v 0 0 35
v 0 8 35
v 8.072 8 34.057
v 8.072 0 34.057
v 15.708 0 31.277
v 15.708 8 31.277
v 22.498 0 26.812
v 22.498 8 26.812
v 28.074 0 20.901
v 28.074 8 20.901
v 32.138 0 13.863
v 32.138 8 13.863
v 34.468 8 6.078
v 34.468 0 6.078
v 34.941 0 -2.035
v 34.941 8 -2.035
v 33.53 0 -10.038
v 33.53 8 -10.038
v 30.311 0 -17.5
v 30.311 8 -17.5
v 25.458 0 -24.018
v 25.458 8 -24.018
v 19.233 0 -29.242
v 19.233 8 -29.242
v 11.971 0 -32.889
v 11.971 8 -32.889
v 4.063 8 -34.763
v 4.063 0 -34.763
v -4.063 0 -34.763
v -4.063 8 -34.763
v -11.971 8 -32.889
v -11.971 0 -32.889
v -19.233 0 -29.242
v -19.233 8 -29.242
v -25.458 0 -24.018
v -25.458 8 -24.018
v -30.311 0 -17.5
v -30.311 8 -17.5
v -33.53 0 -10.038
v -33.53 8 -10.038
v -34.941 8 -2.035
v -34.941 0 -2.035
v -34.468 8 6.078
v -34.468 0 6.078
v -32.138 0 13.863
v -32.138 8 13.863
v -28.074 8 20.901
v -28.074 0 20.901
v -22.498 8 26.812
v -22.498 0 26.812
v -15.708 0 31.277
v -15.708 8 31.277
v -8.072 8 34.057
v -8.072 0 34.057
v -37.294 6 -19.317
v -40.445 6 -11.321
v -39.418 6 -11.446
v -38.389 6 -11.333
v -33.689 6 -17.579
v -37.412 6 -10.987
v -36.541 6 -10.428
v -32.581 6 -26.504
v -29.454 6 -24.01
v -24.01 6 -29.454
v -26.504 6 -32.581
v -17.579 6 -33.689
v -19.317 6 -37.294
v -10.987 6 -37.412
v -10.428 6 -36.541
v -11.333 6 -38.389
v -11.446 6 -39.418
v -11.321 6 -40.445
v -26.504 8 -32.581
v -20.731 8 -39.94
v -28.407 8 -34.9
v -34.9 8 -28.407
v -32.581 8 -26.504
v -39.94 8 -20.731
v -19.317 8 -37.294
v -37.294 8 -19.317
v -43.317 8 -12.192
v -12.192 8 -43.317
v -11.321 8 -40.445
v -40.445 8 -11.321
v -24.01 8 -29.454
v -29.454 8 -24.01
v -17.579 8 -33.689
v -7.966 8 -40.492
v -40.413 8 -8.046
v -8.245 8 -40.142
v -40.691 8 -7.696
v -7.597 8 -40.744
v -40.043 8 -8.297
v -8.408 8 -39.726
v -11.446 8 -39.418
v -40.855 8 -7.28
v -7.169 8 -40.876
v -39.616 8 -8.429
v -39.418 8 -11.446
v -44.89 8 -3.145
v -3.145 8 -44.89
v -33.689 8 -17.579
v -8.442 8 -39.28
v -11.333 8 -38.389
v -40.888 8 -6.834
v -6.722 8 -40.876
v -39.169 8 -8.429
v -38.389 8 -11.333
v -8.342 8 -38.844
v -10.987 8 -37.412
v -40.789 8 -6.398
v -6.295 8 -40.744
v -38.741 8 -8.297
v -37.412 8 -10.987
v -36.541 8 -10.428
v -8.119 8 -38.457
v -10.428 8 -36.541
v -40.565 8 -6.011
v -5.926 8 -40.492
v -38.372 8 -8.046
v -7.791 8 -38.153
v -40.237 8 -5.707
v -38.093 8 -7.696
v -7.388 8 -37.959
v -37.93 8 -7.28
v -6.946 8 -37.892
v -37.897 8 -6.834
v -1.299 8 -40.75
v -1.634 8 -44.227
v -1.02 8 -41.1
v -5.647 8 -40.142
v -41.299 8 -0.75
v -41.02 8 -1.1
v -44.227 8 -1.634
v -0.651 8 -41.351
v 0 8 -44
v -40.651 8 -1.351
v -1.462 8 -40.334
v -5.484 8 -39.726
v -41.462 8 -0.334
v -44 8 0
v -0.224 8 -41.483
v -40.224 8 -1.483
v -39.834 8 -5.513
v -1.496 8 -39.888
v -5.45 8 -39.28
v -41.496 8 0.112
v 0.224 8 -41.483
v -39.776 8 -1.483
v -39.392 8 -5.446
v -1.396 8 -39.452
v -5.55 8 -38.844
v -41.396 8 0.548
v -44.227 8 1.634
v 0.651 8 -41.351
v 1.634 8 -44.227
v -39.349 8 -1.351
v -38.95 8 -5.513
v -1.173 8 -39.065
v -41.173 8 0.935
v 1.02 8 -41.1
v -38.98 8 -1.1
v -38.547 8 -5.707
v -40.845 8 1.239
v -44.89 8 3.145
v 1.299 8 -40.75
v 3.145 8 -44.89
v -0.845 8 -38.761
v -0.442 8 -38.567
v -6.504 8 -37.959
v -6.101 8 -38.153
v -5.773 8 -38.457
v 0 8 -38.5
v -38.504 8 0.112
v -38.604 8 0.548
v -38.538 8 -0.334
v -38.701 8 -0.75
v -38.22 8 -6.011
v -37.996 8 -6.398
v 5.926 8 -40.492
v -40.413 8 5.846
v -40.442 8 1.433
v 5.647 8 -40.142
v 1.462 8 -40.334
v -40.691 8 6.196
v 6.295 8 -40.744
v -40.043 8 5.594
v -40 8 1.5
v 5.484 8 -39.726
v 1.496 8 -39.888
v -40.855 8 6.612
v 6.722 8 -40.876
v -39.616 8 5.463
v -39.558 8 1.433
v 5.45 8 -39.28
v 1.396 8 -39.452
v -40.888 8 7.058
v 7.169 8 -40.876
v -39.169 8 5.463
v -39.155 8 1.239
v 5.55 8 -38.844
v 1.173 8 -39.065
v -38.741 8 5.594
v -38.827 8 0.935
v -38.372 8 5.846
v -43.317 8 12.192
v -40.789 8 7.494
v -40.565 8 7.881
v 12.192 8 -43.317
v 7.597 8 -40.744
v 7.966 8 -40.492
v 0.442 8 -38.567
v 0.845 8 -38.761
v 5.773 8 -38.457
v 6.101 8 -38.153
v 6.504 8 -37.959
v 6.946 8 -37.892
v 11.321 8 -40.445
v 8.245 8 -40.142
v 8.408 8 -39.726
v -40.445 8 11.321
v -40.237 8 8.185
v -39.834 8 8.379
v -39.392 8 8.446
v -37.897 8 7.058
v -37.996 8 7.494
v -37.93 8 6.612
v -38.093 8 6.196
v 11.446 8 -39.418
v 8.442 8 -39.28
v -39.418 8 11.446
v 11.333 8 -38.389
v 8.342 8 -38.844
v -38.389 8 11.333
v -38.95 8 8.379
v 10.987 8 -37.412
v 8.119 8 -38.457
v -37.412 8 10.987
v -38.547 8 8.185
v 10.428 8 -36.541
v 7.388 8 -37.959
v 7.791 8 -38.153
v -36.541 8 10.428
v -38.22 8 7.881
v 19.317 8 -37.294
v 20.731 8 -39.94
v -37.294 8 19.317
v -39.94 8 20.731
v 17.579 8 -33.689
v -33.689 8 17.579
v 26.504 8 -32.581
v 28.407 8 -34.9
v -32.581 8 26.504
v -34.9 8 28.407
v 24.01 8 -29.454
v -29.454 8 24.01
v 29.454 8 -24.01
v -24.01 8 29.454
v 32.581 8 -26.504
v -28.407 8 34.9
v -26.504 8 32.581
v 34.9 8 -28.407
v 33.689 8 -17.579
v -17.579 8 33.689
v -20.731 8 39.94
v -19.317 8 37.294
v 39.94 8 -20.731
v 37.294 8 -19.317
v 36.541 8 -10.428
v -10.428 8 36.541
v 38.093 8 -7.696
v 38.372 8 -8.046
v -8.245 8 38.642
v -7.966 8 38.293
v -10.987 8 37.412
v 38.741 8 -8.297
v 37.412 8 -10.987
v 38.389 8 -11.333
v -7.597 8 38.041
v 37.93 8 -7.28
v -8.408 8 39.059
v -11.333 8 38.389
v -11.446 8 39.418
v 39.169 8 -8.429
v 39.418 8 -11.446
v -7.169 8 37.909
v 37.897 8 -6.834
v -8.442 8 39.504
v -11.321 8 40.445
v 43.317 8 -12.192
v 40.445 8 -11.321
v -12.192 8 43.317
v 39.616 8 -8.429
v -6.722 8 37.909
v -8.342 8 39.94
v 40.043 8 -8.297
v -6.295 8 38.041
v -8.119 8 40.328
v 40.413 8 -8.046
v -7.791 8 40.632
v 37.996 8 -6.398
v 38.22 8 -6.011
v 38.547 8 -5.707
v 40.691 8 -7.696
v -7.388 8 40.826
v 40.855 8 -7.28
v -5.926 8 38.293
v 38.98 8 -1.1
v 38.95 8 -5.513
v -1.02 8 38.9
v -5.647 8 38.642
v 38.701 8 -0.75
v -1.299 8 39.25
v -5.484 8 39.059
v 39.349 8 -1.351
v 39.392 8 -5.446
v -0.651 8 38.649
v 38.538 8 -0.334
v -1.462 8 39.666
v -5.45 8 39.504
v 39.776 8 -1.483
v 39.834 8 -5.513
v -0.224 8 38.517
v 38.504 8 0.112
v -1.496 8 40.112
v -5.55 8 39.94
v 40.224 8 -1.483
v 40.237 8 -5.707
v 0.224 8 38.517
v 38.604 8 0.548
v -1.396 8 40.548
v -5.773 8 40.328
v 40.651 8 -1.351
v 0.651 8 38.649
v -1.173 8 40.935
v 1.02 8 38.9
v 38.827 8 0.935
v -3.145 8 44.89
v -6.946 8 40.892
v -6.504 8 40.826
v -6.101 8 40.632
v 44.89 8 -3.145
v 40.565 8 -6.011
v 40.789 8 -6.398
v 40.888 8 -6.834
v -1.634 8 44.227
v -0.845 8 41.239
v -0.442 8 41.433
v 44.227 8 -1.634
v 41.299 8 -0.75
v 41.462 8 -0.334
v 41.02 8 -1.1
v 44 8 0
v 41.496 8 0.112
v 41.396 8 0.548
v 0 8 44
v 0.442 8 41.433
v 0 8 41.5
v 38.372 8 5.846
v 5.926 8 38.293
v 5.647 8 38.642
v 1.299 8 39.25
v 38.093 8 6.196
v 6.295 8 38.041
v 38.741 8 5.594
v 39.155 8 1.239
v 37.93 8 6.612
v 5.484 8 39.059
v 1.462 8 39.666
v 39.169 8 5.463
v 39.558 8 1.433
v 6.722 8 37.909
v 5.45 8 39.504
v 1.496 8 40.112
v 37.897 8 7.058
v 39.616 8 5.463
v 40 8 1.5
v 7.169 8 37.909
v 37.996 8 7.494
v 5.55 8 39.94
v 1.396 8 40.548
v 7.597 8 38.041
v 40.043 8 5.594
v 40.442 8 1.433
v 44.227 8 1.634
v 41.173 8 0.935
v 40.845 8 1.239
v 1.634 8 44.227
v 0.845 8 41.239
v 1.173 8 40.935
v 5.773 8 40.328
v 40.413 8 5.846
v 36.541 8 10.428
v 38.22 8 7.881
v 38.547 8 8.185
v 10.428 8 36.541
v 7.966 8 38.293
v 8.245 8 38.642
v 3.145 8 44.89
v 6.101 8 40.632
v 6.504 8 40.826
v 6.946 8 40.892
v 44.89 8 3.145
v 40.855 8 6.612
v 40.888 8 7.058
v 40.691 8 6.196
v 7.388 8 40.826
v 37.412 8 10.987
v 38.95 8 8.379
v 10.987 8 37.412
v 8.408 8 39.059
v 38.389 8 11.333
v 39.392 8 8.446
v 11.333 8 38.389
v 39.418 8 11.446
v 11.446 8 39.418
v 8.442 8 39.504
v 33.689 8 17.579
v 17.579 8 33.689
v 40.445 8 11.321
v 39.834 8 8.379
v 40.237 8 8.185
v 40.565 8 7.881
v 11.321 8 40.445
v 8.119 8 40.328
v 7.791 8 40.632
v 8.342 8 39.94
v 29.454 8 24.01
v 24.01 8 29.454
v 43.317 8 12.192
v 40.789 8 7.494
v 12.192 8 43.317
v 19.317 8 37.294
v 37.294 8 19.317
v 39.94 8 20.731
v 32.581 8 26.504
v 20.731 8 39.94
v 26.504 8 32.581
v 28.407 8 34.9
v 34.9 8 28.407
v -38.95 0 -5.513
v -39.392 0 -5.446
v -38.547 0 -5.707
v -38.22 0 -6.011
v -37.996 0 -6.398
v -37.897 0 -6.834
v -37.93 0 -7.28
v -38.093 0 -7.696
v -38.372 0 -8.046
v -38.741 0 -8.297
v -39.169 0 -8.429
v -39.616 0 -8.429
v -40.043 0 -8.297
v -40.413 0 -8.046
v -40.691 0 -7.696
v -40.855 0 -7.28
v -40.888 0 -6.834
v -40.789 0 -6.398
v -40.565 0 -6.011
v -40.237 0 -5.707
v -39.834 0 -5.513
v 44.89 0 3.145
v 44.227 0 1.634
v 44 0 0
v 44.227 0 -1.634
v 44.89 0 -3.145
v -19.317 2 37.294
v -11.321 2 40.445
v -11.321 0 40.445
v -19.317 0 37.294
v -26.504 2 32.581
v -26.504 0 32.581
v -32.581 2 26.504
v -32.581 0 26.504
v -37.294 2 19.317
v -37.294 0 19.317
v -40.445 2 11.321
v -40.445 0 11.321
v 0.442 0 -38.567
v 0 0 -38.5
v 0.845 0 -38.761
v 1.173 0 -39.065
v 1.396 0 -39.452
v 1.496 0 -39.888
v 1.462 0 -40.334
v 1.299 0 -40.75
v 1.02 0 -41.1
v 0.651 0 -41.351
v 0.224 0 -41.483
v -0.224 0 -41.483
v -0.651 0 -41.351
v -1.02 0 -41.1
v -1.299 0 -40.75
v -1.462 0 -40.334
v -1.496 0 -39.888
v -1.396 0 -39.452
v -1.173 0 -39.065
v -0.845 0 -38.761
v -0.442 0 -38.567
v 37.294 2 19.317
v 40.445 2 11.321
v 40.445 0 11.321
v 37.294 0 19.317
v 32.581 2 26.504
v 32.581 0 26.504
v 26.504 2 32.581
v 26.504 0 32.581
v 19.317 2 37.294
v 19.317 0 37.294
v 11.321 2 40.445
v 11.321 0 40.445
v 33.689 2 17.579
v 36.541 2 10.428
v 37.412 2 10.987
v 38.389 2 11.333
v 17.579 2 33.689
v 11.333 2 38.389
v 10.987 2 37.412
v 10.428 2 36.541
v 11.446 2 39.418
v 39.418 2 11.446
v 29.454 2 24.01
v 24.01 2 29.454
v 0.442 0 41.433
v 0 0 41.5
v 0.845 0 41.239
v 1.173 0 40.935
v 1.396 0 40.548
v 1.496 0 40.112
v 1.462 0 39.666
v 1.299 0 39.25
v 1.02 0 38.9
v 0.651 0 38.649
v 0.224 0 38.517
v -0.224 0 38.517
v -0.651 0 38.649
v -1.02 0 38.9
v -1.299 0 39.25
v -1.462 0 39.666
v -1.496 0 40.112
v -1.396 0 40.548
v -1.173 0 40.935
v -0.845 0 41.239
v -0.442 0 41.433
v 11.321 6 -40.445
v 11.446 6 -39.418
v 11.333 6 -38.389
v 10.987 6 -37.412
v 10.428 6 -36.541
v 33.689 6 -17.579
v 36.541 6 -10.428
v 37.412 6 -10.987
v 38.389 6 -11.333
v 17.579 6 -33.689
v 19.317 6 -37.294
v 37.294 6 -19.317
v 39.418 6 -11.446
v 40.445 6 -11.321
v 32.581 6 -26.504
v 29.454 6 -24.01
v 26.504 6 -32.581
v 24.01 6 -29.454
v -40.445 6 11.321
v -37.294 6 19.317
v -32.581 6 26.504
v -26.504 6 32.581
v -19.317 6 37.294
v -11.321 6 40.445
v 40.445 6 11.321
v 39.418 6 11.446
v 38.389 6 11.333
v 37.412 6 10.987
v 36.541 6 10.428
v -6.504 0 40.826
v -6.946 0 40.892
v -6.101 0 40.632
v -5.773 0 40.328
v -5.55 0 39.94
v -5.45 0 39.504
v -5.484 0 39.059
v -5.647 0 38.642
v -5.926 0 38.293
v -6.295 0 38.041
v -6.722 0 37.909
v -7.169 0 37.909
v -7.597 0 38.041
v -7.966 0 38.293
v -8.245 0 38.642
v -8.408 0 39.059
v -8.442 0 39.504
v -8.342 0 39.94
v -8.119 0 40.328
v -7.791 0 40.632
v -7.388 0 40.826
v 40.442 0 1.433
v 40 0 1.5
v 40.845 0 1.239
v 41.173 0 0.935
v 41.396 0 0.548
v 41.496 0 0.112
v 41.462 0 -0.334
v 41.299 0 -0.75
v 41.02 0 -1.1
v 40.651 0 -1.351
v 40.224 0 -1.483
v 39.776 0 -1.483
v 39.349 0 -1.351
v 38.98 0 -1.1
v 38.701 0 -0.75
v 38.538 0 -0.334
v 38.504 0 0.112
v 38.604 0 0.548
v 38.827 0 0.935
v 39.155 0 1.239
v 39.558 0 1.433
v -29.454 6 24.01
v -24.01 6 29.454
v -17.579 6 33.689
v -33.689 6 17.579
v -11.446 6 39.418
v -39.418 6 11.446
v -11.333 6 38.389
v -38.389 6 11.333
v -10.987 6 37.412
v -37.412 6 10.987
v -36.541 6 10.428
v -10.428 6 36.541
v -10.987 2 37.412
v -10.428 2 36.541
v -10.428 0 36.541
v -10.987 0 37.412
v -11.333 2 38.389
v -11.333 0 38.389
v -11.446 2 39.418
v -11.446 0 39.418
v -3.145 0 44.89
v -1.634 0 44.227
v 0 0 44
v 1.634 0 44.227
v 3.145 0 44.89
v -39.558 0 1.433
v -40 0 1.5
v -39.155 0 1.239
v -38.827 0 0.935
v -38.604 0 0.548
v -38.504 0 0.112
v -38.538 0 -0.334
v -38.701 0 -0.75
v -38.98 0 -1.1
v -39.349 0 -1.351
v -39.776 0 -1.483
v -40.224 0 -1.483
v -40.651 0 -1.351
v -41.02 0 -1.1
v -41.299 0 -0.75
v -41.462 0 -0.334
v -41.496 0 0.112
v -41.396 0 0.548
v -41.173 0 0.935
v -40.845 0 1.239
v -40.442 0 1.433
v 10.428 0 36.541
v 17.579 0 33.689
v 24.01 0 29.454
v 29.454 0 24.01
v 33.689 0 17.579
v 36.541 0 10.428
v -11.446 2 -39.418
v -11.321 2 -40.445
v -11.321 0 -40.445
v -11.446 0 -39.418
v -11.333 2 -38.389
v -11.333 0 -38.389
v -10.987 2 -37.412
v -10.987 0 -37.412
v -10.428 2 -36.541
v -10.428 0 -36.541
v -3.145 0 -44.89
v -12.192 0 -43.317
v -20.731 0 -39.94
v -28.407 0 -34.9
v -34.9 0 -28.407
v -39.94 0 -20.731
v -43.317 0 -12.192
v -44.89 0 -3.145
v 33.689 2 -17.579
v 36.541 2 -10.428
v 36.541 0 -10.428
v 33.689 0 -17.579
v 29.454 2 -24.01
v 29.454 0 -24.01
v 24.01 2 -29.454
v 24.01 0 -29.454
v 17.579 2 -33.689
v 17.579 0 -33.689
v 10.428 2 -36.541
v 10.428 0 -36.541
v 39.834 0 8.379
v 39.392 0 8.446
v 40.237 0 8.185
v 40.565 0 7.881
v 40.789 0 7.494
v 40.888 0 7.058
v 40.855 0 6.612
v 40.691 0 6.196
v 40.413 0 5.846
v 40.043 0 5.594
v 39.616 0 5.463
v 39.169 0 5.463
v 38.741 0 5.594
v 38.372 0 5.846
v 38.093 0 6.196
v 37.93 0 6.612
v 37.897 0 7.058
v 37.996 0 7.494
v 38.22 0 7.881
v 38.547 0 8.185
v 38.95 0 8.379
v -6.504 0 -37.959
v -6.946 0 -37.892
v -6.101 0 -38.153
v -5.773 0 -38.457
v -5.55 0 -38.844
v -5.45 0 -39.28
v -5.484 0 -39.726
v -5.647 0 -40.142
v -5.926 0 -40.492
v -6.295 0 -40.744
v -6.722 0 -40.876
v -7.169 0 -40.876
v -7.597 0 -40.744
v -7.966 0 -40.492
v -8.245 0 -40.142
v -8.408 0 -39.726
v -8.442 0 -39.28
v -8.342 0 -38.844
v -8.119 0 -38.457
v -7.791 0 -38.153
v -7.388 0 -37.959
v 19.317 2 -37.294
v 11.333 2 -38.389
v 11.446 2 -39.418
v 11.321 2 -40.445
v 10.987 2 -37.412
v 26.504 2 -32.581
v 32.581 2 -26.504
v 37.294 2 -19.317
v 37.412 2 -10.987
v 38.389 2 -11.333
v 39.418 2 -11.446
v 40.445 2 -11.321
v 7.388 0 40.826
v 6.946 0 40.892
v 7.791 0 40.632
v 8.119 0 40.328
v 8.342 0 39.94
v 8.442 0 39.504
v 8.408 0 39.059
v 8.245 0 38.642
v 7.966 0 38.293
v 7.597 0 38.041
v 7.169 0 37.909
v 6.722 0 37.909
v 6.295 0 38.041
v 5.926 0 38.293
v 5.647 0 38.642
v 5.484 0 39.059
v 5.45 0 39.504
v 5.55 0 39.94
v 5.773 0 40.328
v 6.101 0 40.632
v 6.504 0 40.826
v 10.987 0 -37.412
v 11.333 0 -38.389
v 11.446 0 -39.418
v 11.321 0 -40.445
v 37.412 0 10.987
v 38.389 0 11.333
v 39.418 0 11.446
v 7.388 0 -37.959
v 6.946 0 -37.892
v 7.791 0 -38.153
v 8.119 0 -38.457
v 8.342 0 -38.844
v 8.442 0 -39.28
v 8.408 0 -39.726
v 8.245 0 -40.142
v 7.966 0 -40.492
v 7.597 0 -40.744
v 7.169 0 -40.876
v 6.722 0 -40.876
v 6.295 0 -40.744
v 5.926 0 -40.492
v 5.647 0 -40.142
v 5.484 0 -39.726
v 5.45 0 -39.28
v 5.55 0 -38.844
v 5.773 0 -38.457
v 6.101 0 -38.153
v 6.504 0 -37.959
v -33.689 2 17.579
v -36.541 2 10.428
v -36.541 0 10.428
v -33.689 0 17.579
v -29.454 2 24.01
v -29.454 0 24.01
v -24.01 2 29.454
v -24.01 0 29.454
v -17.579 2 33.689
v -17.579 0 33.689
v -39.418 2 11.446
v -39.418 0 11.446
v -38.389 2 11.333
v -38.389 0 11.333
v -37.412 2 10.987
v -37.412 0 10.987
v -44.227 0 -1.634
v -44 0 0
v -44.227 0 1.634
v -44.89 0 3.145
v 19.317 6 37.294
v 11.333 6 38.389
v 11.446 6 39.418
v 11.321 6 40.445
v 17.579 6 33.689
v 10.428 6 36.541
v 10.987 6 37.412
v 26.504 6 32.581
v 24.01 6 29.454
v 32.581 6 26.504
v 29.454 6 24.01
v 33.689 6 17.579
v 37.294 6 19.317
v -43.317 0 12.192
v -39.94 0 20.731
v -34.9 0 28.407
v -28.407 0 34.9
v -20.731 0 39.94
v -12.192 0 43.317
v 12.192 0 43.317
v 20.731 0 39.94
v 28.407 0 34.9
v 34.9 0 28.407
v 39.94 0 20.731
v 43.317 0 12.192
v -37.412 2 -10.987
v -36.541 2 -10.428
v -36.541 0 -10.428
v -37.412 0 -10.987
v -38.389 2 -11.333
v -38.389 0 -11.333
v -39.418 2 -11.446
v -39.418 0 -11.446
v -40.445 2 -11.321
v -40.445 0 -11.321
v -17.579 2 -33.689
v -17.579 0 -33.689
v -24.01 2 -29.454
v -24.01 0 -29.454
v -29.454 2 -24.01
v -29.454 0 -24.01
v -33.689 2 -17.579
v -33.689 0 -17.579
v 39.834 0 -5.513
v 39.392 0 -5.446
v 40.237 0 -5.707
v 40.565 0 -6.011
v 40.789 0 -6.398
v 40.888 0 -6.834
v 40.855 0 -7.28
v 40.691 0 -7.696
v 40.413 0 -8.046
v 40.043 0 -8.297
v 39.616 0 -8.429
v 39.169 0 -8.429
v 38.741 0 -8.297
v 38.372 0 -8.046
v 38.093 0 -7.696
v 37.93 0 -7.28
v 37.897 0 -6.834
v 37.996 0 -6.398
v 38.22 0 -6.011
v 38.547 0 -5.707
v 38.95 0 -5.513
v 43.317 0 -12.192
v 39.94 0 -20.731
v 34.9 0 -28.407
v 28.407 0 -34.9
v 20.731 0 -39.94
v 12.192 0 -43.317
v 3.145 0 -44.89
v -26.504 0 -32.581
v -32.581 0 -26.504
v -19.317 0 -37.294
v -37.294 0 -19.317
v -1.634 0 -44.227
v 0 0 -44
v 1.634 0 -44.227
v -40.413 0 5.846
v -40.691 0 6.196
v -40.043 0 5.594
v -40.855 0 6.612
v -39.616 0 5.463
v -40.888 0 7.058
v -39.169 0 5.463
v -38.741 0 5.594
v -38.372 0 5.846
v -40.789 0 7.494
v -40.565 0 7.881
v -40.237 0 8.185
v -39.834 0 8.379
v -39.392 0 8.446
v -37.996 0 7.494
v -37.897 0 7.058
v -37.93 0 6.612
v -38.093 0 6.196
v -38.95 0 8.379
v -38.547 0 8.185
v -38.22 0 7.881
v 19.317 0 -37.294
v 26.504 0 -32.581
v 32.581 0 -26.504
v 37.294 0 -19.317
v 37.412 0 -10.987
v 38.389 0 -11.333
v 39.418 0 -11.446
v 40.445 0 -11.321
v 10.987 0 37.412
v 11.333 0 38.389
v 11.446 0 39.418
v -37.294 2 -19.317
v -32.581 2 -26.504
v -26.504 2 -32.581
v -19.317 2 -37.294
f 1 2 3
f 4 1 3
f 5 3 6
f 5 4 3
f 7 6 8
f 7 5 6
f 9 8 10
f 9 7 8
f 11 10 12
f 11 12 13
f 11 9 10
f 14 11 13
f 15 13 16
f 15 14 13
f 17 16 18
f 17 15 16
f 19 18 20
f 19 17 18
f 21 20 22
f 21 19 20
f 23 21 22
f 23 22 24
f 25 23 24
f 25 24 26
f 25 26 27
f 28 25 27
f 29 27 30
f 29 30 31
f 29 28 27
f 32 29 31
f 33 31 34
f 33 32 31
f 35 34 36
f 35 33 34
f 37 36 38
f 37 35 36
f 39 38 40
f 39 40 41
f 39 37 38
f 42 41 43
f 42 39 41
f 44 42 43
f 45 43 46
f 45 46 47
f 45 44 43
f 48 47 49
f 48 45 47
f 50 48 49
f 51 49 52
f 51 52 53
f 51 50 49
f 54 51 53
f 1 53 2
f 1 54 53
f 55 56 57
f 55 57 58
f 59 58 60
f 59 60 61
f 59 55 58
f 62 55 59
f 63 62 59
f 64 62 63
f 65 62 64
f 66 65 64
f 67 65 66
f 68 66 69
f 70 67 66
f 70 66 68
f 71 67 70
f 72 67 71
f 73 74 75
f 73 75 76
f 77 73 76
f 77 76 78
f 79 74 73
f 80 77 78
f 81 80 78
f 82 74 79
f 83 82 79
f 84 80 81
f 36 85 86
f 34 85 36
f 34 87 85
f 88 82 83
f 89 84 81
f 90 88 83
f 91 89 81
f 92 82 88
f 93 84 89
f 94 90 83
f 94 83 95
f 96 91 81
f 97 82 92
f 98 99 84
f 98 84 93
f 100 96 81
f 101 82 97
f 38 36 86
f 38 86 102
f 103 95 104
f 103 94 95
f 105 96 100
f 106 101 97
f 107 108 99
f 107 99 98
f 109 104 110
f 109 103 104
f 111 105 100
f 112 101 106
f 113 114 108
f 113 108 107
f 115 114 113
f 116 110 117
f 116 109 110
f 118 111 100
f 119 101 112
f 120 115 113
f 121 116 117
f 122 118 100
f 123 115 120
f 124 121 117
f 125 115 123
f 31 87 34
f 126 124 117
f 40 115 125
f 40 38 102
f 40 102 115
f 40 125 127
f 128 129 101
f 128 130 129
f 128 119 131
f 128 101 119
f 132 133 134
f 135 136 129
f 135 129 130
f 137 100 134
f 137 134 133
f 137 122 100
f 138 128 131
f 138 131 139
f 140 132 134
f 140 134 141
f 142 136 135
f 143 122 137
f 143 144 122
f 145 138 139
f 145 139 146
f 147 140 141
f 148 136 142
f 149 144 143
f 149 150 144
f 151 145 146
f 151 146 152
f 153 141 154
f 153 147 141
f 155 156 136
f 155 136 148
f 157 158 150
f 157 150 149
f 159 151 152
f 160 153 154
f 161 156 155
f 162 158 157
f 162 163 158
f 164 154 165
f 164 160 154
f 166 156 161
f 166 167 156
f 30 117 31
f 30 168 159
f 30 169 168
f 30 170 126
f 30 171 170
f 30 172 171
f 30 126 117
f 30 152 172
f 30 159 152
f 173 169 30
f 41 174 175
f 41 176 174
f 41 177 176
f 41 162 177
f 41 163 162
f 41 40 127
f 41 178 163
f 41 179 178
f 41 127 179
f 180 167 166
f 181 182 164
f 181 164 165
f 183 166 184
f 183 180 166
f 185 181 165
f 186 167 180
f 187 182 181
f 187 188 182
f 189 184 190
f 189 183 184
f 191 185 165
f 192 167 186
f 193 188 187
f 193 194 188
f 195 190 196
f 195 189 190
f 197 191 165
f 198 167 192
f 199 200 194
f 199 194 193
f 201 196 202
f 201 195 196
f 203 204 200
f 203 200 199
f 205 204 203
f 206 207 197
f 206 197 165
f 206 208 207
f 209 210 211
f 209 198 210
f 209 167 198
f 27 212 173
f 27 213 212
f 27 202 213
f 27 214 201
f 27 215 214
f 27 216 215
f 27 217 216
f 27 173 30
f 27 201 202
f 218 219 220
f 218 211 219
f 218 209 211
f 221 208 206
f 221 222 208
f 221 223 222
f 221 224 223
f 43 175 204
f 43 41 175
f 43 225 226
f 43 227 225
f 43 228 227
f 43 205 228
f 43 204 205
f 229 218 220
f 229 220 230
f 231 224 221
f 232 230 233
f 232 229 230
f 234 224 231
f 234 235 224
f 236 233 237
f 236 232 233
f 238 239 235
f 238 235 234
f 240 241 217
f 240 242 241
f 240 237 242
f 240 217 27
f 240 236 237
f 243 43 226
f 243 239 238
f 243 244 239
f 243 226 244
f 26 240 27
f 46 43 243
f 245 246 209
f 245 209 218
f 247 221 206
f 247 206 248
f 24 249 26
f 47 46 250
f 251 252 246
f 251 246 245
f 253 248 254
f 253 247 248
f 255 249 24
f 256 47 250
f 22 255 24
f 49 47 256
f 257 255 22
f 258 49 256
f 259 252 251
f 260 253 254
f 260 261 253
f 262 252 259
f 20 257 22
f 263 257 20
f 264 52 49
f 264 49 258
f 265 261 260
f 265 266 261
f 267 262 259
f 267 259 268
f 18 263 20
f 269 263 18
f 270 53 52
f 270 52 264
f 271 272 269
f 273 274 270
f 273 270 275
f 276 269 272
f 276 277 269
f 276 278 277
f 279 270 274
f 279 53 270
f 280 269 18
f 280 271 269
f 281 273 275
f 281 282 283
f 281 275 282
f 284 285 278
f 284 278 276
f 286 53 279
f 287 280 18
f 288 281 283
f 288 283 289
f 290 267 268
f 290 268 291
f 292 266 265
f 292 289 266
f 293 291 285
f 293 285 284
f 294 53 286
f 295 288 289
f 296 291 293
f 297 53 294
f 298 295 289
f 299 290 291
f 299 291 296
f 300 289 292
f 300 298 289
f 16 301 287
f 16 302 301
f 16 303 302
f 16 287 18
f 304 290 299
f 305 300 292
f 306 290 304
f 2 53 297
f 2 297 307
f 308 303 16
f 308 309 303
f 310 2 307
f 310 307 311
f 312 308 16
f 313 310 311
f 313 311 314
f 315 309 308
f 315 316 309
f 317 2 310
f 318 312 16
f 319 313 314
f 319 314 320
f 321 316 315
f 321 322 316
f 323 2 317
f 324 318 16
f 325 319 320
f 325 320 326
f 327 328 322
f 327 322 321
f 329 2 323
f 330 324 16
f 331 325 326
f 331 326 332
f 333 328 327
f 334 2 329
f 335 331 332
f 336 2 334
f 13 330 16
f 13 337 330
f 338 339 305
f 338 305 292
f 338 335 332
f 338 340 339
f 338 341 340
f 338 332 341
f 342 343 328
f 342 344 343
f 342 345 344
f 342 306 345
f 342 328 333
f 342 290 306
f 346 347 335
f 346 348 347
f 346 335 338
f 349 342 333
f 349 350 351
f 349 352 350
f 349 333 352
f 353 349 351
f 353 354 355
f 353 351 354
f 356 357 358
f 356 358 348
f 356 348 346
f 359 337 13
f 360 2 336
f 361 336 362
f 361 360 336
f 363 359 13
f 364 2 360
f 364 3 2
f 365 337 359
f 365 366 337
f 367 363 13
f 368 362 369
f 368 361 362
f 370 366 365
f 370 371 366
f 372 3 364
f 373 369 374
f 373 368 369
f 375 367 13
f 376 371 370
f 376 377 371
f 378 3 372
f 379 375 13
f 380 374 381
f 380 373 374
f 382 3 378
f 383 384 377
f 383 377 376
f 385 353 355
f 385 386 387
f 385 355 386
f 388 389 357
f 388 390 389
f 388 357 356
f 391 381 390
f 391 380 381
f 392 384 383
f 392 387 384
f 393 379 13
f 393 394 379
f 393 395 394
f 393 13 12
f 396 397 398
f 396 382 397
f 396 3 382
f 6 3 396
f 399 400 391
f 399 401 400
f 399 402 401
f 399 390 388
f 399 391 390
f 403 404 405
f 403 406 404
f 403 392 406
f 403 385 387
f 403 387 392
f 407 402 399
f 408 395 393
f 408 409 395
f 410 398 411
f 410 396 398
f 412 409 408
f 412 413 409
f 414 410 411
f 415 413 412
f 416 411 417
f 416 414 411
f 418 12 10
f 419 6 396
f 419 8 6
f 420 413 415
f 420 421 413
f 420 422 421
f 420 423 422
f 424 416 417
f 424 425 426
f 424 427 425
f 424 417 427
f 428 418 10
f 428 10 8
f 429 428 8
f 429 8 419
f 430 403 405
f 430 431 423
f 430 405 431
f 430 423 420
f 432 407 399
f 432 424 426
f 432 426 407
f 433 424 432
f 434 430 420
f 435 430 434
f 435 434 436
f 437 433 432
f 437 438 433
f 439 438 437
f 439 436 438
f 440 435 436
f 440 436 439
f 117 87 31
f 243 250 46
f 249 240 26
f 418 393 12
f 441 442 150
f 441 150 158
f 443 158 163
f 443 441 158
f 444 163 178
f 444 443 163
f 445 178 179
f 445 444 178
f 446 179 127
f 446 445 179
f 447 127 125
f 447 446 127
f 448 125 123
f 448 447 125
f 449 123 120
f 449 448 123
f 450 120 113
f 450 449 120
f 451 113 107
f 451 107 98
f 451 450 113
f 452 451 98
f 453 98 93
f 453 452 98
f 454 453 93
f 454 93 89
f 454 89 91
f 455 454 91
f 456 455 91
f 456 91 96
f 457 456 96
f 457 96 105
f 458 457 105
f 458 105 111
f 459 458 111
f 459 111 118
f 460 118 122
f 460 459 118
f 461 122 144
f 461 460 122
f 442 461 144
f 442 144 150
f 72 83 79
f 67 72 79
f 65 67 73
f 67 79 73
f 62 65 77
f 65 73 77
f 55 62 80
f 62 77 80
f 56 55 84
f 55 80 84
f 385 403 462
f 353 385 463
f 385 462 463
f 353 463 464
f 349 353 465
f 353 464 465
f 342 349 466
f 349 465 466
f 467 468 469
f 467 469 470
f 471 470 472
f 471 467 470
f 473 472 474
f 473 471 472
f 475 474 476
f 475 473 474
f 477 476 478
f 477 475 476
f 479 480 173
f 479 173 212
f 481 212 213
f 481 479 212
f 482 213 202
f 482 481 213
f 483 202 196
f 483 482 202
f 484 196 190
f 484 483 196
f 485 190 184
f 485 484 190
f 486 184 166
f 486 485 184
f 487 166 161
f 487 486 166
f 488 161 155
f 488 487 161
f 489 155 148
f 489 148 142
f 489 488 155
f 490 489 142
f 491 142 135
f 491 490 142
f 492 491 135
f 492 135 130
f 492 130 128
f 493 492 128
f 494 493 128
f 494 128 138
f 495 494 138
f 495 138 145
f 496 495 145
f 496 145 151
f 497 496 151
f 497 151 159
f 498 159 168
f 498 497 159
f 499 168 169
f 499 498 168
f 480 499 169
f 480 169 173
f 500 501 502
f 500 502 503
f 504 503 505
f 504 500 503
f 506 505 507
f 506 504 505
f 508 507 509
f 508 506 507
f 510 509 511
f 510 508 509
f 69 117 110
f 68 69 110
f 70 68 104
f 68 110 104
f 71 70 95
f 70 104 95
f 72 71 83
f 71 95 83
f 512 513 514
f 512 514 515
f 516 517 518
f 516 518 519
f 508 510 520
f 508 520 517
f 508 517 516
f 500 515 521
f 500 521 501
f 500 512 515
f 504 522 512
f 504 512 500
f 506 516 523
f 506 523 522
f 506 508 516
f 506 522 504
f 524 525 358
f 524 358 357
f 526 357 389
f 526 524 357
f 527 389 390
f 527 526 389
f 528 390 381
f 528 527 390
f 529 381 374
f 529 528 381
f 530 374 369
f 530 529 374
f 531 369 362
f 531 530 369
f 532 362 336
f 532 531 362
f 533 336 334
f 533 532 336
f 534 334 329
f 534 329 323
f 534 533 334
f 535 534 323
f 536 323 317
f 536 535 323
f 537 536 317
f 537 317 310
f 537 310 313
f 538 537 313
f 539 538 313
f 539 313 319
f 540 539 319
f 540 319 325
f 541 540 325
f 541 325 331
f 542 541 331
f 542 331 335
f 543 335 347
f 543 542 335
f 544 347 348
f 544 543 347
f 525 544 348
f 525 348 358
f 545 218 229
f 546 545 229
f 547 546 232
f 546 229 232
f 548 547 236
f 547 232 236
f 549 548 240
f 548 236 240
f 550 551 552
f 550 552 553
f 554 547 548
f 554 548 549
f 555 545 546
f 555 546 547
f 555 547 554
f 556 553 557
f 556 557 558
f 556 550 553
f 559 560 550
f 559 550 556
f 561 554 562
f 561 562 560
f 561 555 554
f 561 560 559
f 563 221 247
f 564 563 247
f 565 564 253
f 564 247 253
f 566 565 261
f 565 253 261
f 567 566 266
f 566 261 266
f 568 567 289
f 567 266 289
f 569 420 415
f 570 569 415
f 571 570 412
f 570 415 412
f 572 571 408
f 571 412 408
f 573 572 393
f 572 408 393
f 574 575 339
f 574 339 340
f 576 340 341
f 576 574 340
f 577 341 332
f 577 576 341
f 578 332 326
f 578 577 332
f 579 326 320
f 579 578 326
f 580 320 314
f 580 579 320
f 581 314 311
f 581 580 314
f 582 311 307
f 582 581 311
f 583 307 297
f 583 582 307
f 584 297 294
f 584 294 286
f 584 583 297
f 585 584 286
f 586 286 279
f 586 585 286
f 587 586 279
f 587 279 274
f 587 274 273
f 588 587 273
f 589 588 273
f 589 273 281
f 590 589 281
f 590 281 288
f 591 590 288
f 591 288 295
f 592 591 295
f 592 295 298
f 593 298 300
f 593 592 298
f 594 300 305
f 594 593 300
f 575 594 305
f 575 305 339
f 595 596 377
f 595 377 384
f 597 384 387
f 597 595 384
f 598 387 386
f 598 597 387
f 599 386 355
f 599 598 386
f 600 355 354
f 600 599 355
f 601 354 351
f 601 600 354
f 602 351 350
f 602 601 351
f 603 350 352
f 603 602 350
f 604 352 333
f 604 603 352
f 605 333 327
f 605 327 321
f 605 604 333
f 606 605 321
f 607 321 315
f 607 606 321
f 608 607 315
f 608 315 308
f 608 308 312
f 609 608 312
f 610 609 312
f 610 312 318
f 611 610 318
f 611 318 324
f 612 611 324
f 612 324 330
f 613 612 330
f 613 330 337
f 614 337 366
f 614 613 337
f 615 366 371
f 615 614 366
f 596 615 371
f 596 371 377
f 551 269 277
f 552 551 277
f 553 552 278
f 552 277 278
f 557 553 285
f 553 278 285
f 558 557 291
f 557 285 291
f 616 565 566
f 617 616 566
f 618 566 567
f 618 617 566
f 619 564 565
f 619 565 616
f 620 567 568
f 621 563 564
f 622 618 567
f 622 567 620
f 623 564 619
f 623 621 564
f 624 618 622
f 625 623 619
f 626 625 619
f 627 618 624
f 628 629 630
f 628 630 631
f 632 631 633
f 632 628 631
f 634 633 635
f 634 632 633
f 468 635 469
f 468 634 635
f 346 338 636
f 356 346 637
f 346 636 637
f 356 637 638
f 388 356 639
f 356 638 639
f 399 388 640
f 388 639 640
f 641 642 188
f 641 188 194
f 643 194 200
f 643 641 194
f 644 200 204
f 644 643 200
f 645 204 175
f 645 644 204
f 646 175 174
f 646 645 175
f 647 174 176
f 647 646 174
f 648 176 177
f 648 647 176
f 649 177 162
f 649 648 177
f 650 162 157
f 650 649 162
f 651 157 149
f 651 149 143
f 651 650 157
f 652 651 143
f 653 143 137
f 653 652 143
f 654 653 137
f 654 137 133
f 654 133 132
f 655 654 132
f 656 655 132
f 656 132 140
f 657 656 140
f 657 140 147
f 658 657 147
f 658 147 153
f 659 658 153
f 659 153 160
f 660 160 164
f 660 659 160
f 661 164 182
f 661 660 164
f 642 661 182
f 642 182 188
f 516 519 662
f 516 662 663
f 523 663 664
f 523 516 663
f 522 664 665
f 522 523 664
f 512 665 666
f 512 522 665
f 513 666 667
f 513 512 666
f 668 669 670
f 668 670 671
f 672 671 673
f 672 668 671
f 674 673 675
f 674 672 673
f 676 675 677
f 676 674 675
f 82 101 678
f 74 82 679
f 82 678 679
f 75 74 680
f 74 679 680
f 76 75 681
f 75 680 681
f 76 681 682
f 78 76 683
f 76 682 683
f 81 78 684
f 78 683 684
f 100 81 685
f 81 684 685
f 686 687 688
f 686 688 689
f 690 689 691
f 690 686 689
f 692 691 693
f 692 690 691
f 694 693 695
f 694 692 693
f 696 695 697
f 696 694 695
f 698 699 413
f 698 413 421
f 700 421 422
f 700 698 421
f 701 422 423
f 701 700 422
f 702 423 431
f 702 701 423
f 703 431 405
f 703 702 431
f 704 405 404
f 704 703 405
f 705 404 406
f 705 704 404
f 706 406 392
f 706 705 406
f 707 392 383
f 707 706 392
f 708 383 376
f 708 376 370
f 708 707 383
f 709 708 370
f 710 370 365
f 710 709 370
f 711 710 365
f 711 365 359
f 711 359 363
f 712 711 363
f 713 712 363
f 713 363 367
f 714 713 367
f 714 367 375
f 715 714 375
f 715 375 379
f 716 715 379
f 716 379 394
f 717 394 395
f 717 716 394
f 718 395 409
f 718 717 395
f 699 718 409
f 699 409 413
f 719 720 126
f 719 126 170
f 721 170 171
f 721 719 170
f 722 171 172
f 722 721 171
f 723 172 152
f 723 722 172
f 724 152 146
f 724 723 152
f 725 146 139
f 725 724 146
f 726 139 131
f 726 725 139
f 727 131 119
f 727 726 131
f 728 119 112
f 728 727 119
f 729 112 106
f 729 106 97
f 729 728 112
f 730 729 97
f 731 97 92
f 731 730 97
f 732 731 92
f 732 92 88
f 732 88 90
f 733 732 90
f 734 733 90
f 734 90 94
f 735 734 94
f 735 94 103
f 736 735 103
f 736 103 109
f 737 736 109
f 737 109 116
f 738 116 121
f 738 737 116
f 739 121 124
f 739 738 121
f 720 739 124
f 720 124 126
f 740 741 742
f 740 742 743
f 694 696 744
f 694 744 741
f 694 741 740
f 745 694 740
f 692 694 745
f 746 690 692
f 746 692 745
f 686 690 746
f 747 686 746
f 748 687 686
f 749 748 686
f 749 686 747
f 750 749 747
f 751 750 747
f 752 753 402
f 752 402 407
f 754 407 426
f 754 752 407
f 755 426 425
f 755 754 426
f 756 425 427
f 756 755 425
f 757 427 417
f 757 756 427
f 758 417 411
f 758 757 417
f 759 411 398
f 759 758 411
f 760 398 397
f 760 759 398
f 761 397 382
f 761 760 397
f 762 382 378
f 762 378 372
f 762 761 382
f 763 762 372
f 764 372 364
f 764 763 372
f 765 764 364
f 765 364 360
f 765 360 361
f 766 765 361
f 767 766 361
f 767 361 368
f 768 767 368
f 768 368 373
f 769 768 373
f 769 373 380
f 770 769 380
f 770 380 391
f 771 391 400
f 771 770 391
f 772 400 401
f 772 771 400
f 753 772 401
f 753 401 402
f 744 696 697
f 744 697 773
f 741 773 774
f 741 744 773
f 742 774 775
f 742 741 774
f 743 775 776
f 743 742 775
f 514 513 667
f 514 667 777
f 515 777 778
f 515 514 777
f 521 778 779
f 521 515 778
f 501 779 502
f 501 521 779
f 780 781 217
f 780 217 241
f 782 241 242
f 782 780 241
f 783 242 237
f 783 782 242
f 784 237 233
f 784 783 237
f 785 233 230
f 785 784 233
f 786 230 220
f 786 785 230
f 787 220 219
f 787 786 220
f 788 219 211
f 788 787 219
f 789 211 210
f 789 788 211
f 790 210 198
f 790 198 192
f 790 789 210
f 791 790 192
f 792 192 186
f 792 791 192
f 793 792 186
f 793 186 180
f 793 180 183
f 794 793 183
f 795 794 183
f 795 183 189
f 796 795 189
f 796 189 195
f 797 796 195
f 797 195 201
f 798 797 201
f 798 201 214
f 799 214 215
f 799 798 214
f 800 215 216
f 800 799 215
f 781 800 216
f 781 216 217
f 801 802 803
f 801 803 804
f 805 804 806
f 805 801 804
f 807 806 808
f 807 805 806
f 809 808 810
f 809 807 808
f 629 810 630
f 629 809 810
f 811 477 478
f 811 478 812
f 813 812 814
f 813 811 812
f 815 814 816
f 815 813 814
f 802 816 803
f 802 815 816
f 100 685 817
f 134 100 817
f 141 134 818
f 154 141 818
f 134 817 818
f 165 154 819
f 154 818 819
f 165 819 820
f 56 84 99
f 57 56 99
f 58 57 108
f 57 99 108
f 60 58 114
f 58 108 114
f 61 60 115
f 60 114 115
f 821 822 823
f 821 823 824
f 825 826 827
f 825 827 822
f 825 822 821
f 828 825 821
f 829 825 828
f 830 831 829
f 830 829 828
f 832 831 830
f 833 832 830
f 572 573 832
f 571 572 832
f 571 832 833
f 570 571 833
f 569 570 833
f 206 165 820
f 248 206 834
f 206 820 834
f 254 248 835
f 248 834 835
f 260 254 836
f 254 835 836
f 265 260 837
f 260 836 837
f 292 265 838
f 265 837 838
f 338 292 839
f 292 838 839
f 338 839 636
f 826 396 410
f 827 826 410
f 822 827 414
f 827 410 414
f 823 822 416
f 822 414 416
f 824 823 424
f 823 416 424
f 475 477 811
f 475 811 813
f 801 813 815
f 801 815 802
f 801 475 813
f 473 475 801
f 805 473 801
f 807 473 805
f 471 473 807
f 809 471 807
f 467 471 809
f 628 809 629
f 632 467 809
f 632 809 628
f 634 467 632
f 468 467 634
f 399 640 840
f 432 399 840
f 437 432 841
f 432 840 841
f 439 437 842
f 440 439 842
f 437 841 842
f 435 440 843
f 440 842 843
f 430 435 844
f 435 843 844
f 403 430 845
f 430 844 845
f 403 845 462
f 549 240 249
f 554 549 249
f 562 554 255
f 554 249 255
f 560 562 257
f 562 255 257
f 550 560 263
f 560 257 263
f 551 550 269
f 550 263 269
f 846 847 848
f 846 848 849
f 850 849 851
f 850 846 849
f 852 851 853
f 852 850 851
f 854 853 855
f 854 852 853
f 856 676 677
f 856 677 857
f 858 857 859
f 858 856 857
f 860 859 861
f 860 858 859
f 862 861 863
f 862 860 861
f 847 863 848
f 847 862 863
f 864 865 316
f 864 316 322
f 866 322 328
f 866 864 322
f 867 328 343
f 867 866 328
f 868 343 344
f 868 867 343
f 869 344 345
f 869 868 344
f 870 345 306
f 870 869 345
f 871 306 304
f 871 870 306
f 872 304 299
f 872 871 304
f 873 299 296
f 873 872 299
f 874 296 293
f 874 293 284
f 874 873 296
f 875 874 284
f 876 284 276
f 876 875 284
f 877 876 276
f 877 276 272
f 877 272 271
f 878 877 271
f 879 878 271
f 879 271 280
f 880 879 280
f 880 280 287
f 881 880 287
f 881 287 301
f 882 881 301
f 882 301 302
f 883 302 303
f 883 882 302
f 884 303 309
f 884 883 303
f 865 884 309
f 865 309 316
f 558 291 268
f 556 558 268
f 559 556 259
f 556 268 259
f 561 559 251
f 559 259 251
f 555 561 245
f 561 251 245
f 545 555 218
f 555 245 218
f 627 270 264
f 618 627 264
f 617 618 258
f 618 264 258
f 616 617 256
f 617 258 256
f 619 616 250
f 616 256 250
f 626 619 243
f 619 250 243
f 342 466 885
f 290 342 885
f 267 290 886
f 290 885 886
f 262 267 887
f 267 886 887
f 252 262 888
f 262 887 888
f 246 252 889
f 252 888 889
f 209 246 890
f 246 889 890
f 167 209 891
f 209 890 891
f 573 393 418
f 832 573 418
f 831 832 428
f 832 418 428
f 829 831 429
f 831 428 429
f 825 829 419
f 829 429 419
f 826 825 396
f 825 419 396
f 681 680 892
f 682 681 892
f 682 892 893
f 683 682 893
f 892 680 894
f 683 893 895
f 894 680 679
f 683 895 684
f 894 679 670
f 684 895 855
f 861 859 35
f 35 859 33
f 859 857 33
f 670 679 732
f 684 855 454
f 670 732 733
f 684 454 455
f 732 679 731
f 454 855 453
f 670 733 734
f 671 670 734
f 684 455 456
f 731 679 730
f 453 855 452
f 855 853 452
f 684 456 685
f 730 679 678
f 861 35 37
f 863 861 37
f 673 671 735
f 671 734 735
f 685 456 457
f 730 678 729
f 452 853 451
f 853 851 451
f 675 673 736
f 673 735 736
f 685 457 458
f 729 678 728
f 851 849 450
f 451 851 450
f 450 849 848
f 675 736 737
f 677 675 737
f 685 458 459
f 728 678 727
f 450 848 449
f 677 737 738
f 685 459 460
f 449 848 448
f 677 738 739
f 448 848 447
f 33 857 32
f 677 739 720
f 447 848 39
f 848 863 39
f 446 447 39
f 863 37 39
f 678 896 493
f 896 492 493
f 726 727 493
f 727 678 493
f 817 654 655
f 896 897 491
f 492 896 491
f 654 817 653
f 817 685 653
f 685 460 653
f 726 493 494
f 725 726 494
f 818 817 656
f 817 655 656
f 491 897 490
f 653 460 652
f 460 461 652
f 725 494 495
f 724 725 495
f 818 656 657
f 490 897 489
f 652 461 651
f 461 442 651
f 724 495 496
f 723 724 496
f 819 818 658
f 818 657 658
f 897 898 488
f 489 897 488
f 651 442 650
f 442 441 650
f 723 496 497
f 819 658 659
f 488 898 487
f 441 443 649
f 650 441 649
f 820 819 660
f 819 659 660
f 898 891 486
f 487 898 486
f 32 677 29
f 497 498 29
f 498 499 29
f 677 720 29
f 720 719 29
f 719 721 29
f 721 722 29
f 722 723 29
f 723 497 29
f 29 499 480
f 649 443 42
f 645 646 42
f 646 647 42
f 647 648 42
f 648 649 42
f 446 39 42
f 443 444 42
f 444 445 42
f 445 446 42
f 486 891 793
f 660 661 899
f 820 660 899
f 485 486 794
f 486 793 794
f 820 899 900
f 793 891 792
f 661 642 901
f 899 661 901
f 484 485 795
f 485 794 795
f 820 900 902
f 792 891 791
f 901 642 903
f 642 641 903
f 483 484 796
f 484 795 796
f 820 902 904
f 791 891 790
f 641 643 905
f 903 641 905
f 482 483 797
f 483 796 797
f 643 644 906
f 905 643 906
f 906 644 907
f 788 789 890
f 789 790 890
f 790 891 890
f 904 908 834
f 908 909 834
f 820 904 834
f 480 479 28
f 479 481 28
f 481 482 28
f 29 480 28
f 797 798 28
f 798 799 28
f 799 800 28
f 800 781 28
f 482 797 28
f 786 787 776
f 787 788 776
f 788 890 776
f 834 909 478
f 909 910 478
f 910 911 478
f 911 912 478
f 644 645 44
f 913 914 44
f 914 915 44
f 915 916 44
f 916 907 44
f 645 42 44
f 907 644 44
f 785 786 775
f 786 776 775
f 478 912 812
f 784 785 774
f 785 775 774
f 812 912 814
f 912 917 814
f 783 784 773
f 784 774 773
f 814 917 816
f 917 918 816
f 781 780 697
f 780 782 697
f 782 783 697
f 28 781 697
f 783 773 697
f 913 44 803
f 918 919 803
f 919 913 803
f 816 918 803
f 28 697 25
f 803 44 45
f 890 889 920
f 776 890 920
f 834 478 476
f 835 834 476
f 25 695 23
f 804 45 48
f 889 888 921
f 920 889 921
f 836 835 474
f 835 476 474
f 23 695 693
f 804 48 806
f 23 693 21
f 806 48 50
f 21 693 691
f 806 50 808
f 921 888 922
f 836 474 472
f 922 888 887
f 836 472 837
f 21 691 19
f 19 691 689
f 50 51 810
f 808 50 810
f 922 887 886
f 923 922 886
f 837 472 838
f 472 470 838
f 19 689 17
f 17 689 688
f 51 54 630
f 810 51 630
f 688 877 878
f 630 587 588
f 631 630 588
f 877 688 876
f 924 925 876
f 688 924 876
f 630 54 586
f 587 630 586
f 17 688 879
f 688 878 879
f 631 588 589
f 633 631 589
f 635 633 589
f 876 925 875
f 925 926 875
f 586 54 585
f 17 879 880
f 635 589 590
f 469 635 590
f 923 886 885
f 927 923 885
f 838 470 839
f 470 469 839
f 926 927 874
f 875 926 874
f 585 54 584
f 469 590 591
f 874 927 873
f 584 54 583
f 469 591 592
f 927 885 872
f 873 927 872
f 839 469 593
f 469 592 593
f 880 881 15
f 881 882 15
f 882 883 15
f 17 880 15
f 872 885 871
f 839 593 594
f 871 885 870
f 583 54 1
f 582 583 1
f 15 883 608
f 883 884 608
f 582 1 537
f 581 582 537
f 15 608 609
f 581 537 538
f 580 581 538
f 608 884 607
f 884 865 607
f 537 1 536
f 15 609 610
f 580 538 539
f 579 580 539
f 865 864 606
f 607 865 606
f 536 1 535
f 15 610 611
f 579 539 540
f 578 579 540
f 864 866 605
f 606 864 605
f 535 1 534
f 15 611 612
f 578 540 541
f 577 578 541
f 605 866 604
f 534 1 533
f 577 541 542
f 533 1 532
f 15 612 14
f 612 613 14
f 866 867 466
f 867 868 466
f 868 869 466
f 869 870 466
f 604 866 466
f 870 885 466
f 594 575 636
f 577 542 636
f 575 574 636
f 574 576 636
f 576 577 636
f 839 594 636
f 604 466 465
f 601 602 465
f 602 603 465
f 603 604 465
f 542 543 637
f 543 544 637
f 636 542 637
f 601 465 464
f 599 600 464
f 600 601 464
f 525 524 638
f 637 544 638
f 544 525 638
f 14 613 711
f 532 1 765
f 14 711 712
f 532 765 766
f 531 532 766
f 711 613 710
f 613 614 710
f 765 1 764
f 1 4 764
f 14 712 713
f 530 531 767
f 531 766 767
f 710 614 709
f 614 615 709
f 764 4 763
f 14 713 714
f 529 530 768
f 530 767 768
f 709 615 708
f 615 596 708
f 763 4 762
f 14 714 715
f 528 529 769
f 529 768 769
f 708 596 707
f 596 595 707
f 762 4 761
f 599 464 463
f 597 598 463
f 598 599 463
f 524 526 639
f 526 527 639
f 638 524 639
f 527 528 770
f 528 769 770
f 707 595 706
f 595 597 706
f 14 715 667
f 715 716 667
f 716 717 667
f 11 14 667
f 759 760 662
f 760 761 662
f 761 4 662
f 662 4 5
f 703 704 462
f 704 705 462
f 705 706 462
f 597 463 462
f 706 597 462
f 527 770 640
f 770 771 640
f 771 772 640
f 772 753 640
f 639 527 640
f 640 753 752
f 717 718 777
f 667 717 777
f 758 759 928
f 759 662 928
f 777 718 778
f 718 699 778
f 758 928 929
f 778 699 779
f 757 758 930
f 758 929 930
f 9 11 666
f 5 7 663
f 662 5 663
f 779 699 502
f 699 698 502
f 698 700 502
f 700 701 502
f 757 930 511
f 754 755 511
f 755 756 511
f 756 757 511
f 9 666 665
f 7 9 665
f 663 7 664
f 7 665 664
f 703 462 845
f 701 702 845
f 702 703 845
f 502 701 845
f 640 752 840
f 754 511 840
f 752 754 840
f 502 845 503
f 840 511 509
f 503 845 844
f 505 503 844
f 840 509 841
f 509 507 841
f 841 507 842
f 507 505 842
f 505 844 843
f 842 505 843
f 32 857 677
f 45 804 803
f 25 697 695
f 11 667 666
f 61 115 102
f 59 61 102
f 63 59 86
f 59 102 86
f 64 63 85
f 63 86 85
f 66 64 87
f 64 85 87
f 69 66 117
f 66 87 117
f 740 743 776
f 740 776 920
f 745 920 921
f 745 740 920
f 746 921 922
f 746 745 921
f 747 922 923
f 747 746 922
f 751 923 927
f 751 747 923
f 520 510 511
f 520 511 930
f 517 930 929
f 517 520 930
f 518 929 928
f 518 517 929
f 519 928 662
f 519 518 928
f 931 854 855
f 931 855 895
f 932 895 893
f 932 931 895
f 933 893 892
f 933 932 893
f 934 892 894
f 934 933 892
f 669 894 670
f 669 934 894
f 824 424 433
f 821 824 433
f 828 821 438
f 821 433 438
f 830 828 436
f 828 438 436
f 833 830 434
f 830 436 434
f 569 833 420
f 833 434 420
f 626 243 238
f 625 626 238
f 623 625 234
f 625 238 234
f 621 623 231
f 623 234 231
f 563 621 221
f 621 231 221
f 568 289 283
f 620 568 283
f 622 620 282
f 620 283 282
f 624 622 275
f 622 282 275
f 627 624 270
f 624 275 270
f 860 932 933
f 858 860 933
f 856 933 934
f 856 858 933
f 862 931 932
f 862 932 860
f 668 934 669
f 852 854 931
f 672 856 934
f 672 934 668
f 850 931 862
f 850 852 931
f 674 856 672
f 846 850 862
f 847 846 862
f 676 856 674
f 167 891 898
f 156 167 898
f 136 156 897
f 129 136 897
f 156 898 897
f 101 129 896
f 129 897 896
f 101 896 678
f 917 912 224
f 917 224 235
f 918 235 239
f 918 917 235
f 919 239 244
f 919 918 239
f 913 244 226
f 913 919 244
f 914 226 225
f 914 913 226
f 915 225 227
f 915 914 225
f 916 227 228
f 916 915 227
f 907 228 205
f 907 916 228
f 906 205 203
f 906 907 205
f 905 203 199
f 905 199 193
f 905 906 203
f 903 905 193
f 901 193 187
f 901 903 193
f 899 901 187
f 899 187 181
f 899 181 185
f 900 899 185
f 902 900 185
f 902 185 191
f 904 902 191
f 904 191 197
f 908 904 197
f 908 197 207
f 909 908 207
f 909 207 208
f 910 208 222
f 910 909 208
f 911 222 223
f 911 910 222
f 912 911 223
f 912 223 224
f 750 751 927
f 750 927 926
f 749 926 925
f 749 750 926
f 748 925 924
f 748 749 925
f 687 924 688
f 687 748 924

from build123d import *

# Parameters (mm, degrees)
SKETCH1_R           = 45
SKETCH1_R_2         = 1.5
SKETCH1_R_3         = 35
BOSS_EXTRUDE1_DEPTH = 8
CUT_EXTRUDE1_DEPTH  = 2
CUT_EXTRUDE2_START  = -2
CUT_EXTRUDE2_DEPTH  = 2
SKETCH4_R           = 6
CUT_EXTRUDE3_DEPTH  = 10


with BuildPart() as part:
    # Sketch1 → Boss-Extrude1 (new body)
    with BuildSketch(Plane(origin=(0, 0, 0), x_dir=(1, 0, 0), z_dir=(0, 1, 0))):
        with Locations(Location((0, 0, 0), (0, 0, 270))):
            Circle(SKETCH1_R)
        with Locations(Location((0, 40, 0), (0, 0, 270))):
            Circle(SKETCH1_R_2, mode=Mode.SUBTRACT)
        with Locations(Location((40, 0, 0), (0, 0, 270))):
            Circle(SKETCH1_R_2, mode=Mode.SUBTRACT)
        with Locations(Location((0, -40, 0), (0, 0, 270))):
            Circle(SKETCH1_R_2, mode=Mode.SUBTRACT)
        with Locations(Location((-40, 0, 0), (0, 0, 270))):
            Circle(SKETCH1_R_2, mode=Mode.SUBTRACT)
        with Locations(Location((0, 0, 0), (0, 0, 270))):
            Circle(SKETCH1_R_3, mode=Mode.SUBTRACT)
        with Locations(Location((6.945927107, 39.39231012, 0), (0, 0, 270))):
            Circle(SKETCH1_R_2, mode=Mode.SUBTRACT)
        with Locations(Location((-6.945927107, 39.39231012, 0), (0, 0, 270))):
            Circle(SKETCH1_R_2, mode=Mode.SUBTRACT)
        with Locations(Location((39.39231012, 6.945927107, 0), (0, 0, 270))):
            Circle(SKETCH1_R_2, mode=Mode.SUBTRACT)
        with Locations(Location((39.39231012, -6.945927107, 0), (0, 0, 270))):
            Circle(SKETCH1_R_2, mode=Mode.SUBTRACT)
        with Locations(Location((6.945927107, -39.39231012, 0), (0, 0, 270))):
            Circle(SKETCH1_R_2, mode=Mode.SUBTRACT)
        with Locations(Location((-6.945927107, -39.39231012, 0), (0, 0, 270))):
            Circle(SKETCH1_R_2, mode=Mode.SUBTRACT)
        with Locations(Location((-39.39231012, -6.945927107, 0), (0, 0, 270))):
            Circle(SKETCH1_R_2, mode=Mode.SUBTRACT)
        with Locations(Location((-39.39231012, 6.945927107, 0), (0, 0, 270))):
            Circle(SKETCH1_R_2, mode=Mode.SUBTRACT)
    extrude(amount=BOSS_EXTRUDE1_DEPTH)

    # Sketch2 → Cut-Extrude1 (cut)
    with BuildSketch(Plane(origin=(0, 8, 0), x_dir=(1, 0, 0), z_dir=(0, 1, 0))):
        with BuildLine():
            ThreePointArc((10.427551367, 36.541294072), (26.870057685, 26.870057685), (36.541294072, 10.427551367))
            ThreePointArc((36.541294072, 10.427551367), (38.388510428, 11.332541539), (40.445469638, 11.320953396))
            ThreePointArc((40.445469638, 11.320953396), (29.69848481, 29.69848481), (11.320953396, 40.445469638))
            ThreePointArc((11.320953396, 40.445469638), (11.332541539, 38.388510428), (10.427551367, 36.541294072))
        make_face()
        with BuildLine():
            ThreePointArc((40.445469638, -11.320953396), (38.388510428, -11.332541539), (36.541294072, -10.427551367))
            ThreePointArc((36.541294072, -10.427551367), (26.870057685, -26.870057685), (10.427551367, -36.541294072))
            ThreePointArc((10.427551367, -36.541294072), (11.332541539, -38.388510428), (11.320953396, -40.445469638))
            ThreePointArc((11.320953396, -40.445469638), (29.69848481, -29.69848481), (40.445469638, -11.320953396))
        make_face()
        with BuildLine():
            ThreePointArc((-36.541294072, 10.427551367), (-26.870057685, 26.870057685), (-10.427551367, 36.541294072))
            ThreePointArc((-10.427551367, 36.541294072), (-11.332541539, 38.388510428), (-11.320953396, 40.445469638))
            ThreePointArc((-11.320953396, 40.445469638), (-29.69848481, 29.69848481), (-40.445469638, 11.320953396))
            ThreePointArc((-40.445469638, 11.320953396), (-38.388510428, 11.332541539), (-36.541294072, 10.427551367))
        make_face()
        with BuildLine():
            ThreePointArc((-11.320953396, -40.445469638), (-11.332541539, -38.388510428), (-10.427551367, -36.541294072))
            ThreePointArc((-10.427551367, -36.541294072), (-26.870057685, -26.870057685), (-36.541294072, -10.427551367))
            ThreePointArc((-36.541294072, -10.427551367), (-38.388510428, -11.332541539), (-40.445469638, -11.320953396))
            ThreePointArc((-40.445469638, -11.320953396), (-29.69848481, -29.69848481), (-11.320953396, -40.445469638))
        make_face()
    extrude(amount=-CUT_EXTRUDE1_DEPTH, mode=Mode.SUBTRACT)

    # Sketch3 → Cut-Extrude2 (cut)
    with BuildSketch(Plane.XZ.offset(CUT_EXTRUDE2_START)):
        with BuildLine():
            ThreePointArc((10.427551367, 36.541294072), (26.870057685, 26.870057685), (36.541294072, 10.427551367))
            ThreePointArc((36.541294072, 10.427551367), (38.388510428, 11.332541539), (40.445469638, 11.320953396))
            ThreePointArc((40.445469638, 11.320953396), (29.69848481, 29.69848481), (11.320953396, 40.445469638))
            ThreePointArc((11.320953396, 40.445469638), (11.332541539, 38.388510428), (10.427551367, 36.541294072))
        make_face()
        with BuildLine():
            ThreePointArc((40.445469638, -11.320953396), (38.388510428, -11.332541539), (36.541294072, -10.427551367))
            ThreePointArc((36.541294072, -10.427551367), (26.870057685, -26.870057685), (10.427551367, -36.541294072))
            ThreePointArc((10.427551367, -36.541294072), (11.332541539, -38.388510428), (11.320953396, -40.445469638))
            ThreePointArc((11.320953396, -40.445469638), (29.69848481, -29.69848481), (40.445469638, -11.320953396))
        make_face()
        with BuildLine():
            ThreePointArc((-36.541294072, 10.427551367), (-26.870057685, 26.870057685), (-10.427551367, 36.541294072))
            ThreePointArc((-10.427551367, 36.541294072), (-11.332541539, 38.388510428), (-11.320953396, 40.445469638))
            ThreePointArc((-11.320953396, 40.445469638), (-29.69848481, 29.69848481), (-40.445469638, 11.320953396))
            ThreePointArc((-40.445469638, 11.320953396), (-38.388510428, 11.332541539), (-36.541294072, 10.427551367))
        make_face()
        with BuildLine():
            ThreePointArc((-11.320953396, -40.445469638), (-11.332541539, -38.388510428), (-10.427551367, -36.541294072))
            ThreePointArc((-10.427551367, -36.541294072), (-26.870057685, -26.870057685), (-36.541294072, -10.427551367))
            ThreePointArc((-36.541294072, -10.427551367), (-38.388510428, -11.332541539), (-40.445469638, -11.320953396))
            ThreePointArc((-40.445469638, -11.320953396), (-29.69848481, -29.69848481), (-11.320953396, -40.445469638))
        make_face()
    extrude(amount=CUT_EXTRUDE2_DEPTH, mode=Mode.SUBTRACT)

    # Sketch4 → Cut-Extrude3 (cut)
    with BuildSketch(Plane(origin=(0, 0, 0), x_dir=(-1, 0, 0), z_dir=(0, -1, 0))):
        with Locations((0, 50)):
            Circle(SKETCH4_R)
        with Locations((50, 0)):
            Circle(SKETCH4_R)
        with Locations((0, -50)):
            Circle(SKETCH4_R)
        with Locations((-50, 0)):
            Circle(SKETCH4_R)
    extrude(amount=-CUT_EXTRUDE3_DEPTH, mode=Mode.SUBTRACT)


solid = part.part
